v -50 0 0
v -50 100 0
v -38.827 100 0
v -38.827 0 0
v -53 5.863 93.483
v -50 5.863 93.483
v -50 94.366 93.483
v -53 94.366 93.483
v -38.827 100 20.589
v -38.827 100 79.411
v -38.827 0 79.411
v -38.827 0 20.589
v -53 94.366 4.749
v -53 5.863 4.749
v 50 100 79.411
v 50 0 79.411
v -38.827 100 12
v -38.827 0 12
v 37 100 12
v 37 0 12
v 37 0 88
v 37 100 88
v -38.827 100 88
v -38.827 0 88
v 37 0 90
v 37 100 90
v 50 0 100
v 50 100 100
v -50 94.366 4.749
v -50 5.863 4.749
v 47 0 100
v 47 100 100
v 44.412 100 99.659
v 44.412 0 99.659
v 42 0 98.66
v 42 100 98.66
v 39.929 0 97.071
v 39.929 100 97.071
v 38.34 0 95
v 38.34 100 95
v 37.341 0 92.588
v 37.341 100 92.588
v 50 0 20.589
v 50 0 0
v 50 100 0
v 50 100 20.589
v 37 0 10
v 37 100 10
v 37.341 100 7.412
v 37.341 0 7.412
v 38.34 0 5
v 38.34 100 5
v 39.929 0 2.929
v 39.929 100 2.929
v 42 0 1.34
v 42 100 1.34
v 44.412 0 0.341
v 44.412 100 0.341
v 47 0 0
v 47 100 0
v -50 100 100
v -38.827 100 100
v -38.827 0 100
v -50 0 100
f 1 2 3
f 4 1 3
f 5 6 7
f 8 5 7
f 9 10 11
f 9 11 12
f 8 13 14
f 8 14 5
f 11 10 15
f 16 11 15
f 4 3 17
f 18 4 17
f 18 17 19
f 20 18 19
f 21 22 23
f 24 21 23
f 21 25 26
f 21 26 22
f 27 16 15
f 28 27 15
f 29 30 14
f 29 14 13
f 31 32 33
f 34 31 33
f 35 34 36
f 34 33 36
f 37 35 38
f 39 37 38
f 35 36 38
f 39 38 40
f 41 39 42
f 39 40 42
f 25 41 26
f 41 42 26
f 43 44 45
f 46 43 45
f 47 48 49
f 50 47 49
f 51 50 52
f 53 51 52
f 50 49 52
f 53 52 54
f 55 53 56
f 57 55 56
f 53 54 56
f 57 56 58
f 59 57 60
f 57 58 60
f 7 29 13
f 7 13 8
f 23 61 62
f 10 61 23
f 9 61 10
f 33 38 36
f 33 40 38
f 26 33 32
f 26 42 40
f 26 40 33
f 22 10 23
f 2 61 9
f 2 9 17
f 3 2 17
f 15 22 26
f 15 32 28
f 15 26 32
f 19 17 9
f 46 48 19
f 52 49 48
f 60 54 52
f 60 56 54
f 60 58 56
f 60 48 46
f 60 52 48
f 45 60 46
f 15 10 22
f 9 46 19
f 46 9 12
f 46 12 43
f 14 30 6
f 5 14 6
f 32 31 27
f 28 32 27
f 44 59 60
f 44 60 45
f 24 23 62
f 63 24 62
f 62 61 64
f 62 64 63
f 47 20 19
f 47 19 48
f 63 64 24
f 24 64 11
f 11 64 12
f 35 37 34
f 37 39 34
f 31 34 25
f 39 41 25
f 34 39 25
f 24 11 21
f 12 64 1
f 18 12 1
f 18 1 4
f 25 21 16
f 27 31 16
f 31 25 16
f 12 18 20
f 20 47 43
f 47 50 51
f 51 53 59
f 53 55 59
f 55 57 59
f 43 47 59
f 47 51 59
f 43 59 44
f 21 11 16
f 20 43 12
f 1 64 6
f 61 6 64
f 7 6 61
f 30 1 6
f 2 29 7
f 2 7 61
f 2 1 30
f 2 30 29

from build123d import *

# Parameters (mm, degrees)
SKETCH2_W           = 100
SKETCH2_H           = 100
BOSS_EXTRUDE2_DEPTH = 100
SKETCH4_W           = 88.827102195
SKETCH4_H           = 58.821478126
CUT_EXTRUDE1_DEPTH  = 100
SKETCH6_W           = 88.733960409
SKETCH6_H           = 88.503004296
BOSS_EXTRUDE3_DEPTH = 3


with BuildPart() as part:
    # Sketch2 → Boss-Extrude2 (new body)
    with BuildSketch(Plane.XY):
        with Locations((0, 50)):
            Rectangle(SKETCH2_W, SKETCH2_H)
    extrude(amount=BOSS_EXTRUDE2_DEPTH)

    # Sketch4 → Cut-Extrude1 (cut)
    with BuildSketch(Plane(origin=(0, 100, 0), x_dir=(1, 0, 0), z_dir=(0, 1, 0))):
        with Locations((5.586448902, -50)):
            Rectangle(SKETCH4_W, SKETCH4_H)
        with BuildLine():
            Line((-38.827102195, -88), (-38.827102195, -100))
            Line((-38.827102195, -100), (47, -100))
            ThreePointArc((47, -100), (39.928932188, -97.071067812), (37, -90))
            Line((37, -90), (37, -88))
            Line((37, -88), (-38.827102195, -88))
        make_face()
        with BuildLine():
            Line((47, 0), (-38.827102195, 0))
            Line((-38.827102195, 0), (-38.827102195, -12))
            Line((-38.827102195, -12), (37, -12))
            Line((37, -12), (37, -10))
            ThreePointArc((37, -10), (39.928932188, -2.928932188), (47, 0))
        make_face()
    extrude(amount=-CUT_EXTRUDE1_DEPTH, mode=Mode.SUBTRACT)

    # Sketch6 → Boss-Extrude3 (add)
    with BuildSketch(Plane.ZY.offset(50)):
        with Locations((49.115734201, 50.114251056)):
            Rectangle(SKETCH6_W, SKETCH6_H)
    extrude(amount=BOSS_EXTRUDE3_DEPTH)


solid = part.part
